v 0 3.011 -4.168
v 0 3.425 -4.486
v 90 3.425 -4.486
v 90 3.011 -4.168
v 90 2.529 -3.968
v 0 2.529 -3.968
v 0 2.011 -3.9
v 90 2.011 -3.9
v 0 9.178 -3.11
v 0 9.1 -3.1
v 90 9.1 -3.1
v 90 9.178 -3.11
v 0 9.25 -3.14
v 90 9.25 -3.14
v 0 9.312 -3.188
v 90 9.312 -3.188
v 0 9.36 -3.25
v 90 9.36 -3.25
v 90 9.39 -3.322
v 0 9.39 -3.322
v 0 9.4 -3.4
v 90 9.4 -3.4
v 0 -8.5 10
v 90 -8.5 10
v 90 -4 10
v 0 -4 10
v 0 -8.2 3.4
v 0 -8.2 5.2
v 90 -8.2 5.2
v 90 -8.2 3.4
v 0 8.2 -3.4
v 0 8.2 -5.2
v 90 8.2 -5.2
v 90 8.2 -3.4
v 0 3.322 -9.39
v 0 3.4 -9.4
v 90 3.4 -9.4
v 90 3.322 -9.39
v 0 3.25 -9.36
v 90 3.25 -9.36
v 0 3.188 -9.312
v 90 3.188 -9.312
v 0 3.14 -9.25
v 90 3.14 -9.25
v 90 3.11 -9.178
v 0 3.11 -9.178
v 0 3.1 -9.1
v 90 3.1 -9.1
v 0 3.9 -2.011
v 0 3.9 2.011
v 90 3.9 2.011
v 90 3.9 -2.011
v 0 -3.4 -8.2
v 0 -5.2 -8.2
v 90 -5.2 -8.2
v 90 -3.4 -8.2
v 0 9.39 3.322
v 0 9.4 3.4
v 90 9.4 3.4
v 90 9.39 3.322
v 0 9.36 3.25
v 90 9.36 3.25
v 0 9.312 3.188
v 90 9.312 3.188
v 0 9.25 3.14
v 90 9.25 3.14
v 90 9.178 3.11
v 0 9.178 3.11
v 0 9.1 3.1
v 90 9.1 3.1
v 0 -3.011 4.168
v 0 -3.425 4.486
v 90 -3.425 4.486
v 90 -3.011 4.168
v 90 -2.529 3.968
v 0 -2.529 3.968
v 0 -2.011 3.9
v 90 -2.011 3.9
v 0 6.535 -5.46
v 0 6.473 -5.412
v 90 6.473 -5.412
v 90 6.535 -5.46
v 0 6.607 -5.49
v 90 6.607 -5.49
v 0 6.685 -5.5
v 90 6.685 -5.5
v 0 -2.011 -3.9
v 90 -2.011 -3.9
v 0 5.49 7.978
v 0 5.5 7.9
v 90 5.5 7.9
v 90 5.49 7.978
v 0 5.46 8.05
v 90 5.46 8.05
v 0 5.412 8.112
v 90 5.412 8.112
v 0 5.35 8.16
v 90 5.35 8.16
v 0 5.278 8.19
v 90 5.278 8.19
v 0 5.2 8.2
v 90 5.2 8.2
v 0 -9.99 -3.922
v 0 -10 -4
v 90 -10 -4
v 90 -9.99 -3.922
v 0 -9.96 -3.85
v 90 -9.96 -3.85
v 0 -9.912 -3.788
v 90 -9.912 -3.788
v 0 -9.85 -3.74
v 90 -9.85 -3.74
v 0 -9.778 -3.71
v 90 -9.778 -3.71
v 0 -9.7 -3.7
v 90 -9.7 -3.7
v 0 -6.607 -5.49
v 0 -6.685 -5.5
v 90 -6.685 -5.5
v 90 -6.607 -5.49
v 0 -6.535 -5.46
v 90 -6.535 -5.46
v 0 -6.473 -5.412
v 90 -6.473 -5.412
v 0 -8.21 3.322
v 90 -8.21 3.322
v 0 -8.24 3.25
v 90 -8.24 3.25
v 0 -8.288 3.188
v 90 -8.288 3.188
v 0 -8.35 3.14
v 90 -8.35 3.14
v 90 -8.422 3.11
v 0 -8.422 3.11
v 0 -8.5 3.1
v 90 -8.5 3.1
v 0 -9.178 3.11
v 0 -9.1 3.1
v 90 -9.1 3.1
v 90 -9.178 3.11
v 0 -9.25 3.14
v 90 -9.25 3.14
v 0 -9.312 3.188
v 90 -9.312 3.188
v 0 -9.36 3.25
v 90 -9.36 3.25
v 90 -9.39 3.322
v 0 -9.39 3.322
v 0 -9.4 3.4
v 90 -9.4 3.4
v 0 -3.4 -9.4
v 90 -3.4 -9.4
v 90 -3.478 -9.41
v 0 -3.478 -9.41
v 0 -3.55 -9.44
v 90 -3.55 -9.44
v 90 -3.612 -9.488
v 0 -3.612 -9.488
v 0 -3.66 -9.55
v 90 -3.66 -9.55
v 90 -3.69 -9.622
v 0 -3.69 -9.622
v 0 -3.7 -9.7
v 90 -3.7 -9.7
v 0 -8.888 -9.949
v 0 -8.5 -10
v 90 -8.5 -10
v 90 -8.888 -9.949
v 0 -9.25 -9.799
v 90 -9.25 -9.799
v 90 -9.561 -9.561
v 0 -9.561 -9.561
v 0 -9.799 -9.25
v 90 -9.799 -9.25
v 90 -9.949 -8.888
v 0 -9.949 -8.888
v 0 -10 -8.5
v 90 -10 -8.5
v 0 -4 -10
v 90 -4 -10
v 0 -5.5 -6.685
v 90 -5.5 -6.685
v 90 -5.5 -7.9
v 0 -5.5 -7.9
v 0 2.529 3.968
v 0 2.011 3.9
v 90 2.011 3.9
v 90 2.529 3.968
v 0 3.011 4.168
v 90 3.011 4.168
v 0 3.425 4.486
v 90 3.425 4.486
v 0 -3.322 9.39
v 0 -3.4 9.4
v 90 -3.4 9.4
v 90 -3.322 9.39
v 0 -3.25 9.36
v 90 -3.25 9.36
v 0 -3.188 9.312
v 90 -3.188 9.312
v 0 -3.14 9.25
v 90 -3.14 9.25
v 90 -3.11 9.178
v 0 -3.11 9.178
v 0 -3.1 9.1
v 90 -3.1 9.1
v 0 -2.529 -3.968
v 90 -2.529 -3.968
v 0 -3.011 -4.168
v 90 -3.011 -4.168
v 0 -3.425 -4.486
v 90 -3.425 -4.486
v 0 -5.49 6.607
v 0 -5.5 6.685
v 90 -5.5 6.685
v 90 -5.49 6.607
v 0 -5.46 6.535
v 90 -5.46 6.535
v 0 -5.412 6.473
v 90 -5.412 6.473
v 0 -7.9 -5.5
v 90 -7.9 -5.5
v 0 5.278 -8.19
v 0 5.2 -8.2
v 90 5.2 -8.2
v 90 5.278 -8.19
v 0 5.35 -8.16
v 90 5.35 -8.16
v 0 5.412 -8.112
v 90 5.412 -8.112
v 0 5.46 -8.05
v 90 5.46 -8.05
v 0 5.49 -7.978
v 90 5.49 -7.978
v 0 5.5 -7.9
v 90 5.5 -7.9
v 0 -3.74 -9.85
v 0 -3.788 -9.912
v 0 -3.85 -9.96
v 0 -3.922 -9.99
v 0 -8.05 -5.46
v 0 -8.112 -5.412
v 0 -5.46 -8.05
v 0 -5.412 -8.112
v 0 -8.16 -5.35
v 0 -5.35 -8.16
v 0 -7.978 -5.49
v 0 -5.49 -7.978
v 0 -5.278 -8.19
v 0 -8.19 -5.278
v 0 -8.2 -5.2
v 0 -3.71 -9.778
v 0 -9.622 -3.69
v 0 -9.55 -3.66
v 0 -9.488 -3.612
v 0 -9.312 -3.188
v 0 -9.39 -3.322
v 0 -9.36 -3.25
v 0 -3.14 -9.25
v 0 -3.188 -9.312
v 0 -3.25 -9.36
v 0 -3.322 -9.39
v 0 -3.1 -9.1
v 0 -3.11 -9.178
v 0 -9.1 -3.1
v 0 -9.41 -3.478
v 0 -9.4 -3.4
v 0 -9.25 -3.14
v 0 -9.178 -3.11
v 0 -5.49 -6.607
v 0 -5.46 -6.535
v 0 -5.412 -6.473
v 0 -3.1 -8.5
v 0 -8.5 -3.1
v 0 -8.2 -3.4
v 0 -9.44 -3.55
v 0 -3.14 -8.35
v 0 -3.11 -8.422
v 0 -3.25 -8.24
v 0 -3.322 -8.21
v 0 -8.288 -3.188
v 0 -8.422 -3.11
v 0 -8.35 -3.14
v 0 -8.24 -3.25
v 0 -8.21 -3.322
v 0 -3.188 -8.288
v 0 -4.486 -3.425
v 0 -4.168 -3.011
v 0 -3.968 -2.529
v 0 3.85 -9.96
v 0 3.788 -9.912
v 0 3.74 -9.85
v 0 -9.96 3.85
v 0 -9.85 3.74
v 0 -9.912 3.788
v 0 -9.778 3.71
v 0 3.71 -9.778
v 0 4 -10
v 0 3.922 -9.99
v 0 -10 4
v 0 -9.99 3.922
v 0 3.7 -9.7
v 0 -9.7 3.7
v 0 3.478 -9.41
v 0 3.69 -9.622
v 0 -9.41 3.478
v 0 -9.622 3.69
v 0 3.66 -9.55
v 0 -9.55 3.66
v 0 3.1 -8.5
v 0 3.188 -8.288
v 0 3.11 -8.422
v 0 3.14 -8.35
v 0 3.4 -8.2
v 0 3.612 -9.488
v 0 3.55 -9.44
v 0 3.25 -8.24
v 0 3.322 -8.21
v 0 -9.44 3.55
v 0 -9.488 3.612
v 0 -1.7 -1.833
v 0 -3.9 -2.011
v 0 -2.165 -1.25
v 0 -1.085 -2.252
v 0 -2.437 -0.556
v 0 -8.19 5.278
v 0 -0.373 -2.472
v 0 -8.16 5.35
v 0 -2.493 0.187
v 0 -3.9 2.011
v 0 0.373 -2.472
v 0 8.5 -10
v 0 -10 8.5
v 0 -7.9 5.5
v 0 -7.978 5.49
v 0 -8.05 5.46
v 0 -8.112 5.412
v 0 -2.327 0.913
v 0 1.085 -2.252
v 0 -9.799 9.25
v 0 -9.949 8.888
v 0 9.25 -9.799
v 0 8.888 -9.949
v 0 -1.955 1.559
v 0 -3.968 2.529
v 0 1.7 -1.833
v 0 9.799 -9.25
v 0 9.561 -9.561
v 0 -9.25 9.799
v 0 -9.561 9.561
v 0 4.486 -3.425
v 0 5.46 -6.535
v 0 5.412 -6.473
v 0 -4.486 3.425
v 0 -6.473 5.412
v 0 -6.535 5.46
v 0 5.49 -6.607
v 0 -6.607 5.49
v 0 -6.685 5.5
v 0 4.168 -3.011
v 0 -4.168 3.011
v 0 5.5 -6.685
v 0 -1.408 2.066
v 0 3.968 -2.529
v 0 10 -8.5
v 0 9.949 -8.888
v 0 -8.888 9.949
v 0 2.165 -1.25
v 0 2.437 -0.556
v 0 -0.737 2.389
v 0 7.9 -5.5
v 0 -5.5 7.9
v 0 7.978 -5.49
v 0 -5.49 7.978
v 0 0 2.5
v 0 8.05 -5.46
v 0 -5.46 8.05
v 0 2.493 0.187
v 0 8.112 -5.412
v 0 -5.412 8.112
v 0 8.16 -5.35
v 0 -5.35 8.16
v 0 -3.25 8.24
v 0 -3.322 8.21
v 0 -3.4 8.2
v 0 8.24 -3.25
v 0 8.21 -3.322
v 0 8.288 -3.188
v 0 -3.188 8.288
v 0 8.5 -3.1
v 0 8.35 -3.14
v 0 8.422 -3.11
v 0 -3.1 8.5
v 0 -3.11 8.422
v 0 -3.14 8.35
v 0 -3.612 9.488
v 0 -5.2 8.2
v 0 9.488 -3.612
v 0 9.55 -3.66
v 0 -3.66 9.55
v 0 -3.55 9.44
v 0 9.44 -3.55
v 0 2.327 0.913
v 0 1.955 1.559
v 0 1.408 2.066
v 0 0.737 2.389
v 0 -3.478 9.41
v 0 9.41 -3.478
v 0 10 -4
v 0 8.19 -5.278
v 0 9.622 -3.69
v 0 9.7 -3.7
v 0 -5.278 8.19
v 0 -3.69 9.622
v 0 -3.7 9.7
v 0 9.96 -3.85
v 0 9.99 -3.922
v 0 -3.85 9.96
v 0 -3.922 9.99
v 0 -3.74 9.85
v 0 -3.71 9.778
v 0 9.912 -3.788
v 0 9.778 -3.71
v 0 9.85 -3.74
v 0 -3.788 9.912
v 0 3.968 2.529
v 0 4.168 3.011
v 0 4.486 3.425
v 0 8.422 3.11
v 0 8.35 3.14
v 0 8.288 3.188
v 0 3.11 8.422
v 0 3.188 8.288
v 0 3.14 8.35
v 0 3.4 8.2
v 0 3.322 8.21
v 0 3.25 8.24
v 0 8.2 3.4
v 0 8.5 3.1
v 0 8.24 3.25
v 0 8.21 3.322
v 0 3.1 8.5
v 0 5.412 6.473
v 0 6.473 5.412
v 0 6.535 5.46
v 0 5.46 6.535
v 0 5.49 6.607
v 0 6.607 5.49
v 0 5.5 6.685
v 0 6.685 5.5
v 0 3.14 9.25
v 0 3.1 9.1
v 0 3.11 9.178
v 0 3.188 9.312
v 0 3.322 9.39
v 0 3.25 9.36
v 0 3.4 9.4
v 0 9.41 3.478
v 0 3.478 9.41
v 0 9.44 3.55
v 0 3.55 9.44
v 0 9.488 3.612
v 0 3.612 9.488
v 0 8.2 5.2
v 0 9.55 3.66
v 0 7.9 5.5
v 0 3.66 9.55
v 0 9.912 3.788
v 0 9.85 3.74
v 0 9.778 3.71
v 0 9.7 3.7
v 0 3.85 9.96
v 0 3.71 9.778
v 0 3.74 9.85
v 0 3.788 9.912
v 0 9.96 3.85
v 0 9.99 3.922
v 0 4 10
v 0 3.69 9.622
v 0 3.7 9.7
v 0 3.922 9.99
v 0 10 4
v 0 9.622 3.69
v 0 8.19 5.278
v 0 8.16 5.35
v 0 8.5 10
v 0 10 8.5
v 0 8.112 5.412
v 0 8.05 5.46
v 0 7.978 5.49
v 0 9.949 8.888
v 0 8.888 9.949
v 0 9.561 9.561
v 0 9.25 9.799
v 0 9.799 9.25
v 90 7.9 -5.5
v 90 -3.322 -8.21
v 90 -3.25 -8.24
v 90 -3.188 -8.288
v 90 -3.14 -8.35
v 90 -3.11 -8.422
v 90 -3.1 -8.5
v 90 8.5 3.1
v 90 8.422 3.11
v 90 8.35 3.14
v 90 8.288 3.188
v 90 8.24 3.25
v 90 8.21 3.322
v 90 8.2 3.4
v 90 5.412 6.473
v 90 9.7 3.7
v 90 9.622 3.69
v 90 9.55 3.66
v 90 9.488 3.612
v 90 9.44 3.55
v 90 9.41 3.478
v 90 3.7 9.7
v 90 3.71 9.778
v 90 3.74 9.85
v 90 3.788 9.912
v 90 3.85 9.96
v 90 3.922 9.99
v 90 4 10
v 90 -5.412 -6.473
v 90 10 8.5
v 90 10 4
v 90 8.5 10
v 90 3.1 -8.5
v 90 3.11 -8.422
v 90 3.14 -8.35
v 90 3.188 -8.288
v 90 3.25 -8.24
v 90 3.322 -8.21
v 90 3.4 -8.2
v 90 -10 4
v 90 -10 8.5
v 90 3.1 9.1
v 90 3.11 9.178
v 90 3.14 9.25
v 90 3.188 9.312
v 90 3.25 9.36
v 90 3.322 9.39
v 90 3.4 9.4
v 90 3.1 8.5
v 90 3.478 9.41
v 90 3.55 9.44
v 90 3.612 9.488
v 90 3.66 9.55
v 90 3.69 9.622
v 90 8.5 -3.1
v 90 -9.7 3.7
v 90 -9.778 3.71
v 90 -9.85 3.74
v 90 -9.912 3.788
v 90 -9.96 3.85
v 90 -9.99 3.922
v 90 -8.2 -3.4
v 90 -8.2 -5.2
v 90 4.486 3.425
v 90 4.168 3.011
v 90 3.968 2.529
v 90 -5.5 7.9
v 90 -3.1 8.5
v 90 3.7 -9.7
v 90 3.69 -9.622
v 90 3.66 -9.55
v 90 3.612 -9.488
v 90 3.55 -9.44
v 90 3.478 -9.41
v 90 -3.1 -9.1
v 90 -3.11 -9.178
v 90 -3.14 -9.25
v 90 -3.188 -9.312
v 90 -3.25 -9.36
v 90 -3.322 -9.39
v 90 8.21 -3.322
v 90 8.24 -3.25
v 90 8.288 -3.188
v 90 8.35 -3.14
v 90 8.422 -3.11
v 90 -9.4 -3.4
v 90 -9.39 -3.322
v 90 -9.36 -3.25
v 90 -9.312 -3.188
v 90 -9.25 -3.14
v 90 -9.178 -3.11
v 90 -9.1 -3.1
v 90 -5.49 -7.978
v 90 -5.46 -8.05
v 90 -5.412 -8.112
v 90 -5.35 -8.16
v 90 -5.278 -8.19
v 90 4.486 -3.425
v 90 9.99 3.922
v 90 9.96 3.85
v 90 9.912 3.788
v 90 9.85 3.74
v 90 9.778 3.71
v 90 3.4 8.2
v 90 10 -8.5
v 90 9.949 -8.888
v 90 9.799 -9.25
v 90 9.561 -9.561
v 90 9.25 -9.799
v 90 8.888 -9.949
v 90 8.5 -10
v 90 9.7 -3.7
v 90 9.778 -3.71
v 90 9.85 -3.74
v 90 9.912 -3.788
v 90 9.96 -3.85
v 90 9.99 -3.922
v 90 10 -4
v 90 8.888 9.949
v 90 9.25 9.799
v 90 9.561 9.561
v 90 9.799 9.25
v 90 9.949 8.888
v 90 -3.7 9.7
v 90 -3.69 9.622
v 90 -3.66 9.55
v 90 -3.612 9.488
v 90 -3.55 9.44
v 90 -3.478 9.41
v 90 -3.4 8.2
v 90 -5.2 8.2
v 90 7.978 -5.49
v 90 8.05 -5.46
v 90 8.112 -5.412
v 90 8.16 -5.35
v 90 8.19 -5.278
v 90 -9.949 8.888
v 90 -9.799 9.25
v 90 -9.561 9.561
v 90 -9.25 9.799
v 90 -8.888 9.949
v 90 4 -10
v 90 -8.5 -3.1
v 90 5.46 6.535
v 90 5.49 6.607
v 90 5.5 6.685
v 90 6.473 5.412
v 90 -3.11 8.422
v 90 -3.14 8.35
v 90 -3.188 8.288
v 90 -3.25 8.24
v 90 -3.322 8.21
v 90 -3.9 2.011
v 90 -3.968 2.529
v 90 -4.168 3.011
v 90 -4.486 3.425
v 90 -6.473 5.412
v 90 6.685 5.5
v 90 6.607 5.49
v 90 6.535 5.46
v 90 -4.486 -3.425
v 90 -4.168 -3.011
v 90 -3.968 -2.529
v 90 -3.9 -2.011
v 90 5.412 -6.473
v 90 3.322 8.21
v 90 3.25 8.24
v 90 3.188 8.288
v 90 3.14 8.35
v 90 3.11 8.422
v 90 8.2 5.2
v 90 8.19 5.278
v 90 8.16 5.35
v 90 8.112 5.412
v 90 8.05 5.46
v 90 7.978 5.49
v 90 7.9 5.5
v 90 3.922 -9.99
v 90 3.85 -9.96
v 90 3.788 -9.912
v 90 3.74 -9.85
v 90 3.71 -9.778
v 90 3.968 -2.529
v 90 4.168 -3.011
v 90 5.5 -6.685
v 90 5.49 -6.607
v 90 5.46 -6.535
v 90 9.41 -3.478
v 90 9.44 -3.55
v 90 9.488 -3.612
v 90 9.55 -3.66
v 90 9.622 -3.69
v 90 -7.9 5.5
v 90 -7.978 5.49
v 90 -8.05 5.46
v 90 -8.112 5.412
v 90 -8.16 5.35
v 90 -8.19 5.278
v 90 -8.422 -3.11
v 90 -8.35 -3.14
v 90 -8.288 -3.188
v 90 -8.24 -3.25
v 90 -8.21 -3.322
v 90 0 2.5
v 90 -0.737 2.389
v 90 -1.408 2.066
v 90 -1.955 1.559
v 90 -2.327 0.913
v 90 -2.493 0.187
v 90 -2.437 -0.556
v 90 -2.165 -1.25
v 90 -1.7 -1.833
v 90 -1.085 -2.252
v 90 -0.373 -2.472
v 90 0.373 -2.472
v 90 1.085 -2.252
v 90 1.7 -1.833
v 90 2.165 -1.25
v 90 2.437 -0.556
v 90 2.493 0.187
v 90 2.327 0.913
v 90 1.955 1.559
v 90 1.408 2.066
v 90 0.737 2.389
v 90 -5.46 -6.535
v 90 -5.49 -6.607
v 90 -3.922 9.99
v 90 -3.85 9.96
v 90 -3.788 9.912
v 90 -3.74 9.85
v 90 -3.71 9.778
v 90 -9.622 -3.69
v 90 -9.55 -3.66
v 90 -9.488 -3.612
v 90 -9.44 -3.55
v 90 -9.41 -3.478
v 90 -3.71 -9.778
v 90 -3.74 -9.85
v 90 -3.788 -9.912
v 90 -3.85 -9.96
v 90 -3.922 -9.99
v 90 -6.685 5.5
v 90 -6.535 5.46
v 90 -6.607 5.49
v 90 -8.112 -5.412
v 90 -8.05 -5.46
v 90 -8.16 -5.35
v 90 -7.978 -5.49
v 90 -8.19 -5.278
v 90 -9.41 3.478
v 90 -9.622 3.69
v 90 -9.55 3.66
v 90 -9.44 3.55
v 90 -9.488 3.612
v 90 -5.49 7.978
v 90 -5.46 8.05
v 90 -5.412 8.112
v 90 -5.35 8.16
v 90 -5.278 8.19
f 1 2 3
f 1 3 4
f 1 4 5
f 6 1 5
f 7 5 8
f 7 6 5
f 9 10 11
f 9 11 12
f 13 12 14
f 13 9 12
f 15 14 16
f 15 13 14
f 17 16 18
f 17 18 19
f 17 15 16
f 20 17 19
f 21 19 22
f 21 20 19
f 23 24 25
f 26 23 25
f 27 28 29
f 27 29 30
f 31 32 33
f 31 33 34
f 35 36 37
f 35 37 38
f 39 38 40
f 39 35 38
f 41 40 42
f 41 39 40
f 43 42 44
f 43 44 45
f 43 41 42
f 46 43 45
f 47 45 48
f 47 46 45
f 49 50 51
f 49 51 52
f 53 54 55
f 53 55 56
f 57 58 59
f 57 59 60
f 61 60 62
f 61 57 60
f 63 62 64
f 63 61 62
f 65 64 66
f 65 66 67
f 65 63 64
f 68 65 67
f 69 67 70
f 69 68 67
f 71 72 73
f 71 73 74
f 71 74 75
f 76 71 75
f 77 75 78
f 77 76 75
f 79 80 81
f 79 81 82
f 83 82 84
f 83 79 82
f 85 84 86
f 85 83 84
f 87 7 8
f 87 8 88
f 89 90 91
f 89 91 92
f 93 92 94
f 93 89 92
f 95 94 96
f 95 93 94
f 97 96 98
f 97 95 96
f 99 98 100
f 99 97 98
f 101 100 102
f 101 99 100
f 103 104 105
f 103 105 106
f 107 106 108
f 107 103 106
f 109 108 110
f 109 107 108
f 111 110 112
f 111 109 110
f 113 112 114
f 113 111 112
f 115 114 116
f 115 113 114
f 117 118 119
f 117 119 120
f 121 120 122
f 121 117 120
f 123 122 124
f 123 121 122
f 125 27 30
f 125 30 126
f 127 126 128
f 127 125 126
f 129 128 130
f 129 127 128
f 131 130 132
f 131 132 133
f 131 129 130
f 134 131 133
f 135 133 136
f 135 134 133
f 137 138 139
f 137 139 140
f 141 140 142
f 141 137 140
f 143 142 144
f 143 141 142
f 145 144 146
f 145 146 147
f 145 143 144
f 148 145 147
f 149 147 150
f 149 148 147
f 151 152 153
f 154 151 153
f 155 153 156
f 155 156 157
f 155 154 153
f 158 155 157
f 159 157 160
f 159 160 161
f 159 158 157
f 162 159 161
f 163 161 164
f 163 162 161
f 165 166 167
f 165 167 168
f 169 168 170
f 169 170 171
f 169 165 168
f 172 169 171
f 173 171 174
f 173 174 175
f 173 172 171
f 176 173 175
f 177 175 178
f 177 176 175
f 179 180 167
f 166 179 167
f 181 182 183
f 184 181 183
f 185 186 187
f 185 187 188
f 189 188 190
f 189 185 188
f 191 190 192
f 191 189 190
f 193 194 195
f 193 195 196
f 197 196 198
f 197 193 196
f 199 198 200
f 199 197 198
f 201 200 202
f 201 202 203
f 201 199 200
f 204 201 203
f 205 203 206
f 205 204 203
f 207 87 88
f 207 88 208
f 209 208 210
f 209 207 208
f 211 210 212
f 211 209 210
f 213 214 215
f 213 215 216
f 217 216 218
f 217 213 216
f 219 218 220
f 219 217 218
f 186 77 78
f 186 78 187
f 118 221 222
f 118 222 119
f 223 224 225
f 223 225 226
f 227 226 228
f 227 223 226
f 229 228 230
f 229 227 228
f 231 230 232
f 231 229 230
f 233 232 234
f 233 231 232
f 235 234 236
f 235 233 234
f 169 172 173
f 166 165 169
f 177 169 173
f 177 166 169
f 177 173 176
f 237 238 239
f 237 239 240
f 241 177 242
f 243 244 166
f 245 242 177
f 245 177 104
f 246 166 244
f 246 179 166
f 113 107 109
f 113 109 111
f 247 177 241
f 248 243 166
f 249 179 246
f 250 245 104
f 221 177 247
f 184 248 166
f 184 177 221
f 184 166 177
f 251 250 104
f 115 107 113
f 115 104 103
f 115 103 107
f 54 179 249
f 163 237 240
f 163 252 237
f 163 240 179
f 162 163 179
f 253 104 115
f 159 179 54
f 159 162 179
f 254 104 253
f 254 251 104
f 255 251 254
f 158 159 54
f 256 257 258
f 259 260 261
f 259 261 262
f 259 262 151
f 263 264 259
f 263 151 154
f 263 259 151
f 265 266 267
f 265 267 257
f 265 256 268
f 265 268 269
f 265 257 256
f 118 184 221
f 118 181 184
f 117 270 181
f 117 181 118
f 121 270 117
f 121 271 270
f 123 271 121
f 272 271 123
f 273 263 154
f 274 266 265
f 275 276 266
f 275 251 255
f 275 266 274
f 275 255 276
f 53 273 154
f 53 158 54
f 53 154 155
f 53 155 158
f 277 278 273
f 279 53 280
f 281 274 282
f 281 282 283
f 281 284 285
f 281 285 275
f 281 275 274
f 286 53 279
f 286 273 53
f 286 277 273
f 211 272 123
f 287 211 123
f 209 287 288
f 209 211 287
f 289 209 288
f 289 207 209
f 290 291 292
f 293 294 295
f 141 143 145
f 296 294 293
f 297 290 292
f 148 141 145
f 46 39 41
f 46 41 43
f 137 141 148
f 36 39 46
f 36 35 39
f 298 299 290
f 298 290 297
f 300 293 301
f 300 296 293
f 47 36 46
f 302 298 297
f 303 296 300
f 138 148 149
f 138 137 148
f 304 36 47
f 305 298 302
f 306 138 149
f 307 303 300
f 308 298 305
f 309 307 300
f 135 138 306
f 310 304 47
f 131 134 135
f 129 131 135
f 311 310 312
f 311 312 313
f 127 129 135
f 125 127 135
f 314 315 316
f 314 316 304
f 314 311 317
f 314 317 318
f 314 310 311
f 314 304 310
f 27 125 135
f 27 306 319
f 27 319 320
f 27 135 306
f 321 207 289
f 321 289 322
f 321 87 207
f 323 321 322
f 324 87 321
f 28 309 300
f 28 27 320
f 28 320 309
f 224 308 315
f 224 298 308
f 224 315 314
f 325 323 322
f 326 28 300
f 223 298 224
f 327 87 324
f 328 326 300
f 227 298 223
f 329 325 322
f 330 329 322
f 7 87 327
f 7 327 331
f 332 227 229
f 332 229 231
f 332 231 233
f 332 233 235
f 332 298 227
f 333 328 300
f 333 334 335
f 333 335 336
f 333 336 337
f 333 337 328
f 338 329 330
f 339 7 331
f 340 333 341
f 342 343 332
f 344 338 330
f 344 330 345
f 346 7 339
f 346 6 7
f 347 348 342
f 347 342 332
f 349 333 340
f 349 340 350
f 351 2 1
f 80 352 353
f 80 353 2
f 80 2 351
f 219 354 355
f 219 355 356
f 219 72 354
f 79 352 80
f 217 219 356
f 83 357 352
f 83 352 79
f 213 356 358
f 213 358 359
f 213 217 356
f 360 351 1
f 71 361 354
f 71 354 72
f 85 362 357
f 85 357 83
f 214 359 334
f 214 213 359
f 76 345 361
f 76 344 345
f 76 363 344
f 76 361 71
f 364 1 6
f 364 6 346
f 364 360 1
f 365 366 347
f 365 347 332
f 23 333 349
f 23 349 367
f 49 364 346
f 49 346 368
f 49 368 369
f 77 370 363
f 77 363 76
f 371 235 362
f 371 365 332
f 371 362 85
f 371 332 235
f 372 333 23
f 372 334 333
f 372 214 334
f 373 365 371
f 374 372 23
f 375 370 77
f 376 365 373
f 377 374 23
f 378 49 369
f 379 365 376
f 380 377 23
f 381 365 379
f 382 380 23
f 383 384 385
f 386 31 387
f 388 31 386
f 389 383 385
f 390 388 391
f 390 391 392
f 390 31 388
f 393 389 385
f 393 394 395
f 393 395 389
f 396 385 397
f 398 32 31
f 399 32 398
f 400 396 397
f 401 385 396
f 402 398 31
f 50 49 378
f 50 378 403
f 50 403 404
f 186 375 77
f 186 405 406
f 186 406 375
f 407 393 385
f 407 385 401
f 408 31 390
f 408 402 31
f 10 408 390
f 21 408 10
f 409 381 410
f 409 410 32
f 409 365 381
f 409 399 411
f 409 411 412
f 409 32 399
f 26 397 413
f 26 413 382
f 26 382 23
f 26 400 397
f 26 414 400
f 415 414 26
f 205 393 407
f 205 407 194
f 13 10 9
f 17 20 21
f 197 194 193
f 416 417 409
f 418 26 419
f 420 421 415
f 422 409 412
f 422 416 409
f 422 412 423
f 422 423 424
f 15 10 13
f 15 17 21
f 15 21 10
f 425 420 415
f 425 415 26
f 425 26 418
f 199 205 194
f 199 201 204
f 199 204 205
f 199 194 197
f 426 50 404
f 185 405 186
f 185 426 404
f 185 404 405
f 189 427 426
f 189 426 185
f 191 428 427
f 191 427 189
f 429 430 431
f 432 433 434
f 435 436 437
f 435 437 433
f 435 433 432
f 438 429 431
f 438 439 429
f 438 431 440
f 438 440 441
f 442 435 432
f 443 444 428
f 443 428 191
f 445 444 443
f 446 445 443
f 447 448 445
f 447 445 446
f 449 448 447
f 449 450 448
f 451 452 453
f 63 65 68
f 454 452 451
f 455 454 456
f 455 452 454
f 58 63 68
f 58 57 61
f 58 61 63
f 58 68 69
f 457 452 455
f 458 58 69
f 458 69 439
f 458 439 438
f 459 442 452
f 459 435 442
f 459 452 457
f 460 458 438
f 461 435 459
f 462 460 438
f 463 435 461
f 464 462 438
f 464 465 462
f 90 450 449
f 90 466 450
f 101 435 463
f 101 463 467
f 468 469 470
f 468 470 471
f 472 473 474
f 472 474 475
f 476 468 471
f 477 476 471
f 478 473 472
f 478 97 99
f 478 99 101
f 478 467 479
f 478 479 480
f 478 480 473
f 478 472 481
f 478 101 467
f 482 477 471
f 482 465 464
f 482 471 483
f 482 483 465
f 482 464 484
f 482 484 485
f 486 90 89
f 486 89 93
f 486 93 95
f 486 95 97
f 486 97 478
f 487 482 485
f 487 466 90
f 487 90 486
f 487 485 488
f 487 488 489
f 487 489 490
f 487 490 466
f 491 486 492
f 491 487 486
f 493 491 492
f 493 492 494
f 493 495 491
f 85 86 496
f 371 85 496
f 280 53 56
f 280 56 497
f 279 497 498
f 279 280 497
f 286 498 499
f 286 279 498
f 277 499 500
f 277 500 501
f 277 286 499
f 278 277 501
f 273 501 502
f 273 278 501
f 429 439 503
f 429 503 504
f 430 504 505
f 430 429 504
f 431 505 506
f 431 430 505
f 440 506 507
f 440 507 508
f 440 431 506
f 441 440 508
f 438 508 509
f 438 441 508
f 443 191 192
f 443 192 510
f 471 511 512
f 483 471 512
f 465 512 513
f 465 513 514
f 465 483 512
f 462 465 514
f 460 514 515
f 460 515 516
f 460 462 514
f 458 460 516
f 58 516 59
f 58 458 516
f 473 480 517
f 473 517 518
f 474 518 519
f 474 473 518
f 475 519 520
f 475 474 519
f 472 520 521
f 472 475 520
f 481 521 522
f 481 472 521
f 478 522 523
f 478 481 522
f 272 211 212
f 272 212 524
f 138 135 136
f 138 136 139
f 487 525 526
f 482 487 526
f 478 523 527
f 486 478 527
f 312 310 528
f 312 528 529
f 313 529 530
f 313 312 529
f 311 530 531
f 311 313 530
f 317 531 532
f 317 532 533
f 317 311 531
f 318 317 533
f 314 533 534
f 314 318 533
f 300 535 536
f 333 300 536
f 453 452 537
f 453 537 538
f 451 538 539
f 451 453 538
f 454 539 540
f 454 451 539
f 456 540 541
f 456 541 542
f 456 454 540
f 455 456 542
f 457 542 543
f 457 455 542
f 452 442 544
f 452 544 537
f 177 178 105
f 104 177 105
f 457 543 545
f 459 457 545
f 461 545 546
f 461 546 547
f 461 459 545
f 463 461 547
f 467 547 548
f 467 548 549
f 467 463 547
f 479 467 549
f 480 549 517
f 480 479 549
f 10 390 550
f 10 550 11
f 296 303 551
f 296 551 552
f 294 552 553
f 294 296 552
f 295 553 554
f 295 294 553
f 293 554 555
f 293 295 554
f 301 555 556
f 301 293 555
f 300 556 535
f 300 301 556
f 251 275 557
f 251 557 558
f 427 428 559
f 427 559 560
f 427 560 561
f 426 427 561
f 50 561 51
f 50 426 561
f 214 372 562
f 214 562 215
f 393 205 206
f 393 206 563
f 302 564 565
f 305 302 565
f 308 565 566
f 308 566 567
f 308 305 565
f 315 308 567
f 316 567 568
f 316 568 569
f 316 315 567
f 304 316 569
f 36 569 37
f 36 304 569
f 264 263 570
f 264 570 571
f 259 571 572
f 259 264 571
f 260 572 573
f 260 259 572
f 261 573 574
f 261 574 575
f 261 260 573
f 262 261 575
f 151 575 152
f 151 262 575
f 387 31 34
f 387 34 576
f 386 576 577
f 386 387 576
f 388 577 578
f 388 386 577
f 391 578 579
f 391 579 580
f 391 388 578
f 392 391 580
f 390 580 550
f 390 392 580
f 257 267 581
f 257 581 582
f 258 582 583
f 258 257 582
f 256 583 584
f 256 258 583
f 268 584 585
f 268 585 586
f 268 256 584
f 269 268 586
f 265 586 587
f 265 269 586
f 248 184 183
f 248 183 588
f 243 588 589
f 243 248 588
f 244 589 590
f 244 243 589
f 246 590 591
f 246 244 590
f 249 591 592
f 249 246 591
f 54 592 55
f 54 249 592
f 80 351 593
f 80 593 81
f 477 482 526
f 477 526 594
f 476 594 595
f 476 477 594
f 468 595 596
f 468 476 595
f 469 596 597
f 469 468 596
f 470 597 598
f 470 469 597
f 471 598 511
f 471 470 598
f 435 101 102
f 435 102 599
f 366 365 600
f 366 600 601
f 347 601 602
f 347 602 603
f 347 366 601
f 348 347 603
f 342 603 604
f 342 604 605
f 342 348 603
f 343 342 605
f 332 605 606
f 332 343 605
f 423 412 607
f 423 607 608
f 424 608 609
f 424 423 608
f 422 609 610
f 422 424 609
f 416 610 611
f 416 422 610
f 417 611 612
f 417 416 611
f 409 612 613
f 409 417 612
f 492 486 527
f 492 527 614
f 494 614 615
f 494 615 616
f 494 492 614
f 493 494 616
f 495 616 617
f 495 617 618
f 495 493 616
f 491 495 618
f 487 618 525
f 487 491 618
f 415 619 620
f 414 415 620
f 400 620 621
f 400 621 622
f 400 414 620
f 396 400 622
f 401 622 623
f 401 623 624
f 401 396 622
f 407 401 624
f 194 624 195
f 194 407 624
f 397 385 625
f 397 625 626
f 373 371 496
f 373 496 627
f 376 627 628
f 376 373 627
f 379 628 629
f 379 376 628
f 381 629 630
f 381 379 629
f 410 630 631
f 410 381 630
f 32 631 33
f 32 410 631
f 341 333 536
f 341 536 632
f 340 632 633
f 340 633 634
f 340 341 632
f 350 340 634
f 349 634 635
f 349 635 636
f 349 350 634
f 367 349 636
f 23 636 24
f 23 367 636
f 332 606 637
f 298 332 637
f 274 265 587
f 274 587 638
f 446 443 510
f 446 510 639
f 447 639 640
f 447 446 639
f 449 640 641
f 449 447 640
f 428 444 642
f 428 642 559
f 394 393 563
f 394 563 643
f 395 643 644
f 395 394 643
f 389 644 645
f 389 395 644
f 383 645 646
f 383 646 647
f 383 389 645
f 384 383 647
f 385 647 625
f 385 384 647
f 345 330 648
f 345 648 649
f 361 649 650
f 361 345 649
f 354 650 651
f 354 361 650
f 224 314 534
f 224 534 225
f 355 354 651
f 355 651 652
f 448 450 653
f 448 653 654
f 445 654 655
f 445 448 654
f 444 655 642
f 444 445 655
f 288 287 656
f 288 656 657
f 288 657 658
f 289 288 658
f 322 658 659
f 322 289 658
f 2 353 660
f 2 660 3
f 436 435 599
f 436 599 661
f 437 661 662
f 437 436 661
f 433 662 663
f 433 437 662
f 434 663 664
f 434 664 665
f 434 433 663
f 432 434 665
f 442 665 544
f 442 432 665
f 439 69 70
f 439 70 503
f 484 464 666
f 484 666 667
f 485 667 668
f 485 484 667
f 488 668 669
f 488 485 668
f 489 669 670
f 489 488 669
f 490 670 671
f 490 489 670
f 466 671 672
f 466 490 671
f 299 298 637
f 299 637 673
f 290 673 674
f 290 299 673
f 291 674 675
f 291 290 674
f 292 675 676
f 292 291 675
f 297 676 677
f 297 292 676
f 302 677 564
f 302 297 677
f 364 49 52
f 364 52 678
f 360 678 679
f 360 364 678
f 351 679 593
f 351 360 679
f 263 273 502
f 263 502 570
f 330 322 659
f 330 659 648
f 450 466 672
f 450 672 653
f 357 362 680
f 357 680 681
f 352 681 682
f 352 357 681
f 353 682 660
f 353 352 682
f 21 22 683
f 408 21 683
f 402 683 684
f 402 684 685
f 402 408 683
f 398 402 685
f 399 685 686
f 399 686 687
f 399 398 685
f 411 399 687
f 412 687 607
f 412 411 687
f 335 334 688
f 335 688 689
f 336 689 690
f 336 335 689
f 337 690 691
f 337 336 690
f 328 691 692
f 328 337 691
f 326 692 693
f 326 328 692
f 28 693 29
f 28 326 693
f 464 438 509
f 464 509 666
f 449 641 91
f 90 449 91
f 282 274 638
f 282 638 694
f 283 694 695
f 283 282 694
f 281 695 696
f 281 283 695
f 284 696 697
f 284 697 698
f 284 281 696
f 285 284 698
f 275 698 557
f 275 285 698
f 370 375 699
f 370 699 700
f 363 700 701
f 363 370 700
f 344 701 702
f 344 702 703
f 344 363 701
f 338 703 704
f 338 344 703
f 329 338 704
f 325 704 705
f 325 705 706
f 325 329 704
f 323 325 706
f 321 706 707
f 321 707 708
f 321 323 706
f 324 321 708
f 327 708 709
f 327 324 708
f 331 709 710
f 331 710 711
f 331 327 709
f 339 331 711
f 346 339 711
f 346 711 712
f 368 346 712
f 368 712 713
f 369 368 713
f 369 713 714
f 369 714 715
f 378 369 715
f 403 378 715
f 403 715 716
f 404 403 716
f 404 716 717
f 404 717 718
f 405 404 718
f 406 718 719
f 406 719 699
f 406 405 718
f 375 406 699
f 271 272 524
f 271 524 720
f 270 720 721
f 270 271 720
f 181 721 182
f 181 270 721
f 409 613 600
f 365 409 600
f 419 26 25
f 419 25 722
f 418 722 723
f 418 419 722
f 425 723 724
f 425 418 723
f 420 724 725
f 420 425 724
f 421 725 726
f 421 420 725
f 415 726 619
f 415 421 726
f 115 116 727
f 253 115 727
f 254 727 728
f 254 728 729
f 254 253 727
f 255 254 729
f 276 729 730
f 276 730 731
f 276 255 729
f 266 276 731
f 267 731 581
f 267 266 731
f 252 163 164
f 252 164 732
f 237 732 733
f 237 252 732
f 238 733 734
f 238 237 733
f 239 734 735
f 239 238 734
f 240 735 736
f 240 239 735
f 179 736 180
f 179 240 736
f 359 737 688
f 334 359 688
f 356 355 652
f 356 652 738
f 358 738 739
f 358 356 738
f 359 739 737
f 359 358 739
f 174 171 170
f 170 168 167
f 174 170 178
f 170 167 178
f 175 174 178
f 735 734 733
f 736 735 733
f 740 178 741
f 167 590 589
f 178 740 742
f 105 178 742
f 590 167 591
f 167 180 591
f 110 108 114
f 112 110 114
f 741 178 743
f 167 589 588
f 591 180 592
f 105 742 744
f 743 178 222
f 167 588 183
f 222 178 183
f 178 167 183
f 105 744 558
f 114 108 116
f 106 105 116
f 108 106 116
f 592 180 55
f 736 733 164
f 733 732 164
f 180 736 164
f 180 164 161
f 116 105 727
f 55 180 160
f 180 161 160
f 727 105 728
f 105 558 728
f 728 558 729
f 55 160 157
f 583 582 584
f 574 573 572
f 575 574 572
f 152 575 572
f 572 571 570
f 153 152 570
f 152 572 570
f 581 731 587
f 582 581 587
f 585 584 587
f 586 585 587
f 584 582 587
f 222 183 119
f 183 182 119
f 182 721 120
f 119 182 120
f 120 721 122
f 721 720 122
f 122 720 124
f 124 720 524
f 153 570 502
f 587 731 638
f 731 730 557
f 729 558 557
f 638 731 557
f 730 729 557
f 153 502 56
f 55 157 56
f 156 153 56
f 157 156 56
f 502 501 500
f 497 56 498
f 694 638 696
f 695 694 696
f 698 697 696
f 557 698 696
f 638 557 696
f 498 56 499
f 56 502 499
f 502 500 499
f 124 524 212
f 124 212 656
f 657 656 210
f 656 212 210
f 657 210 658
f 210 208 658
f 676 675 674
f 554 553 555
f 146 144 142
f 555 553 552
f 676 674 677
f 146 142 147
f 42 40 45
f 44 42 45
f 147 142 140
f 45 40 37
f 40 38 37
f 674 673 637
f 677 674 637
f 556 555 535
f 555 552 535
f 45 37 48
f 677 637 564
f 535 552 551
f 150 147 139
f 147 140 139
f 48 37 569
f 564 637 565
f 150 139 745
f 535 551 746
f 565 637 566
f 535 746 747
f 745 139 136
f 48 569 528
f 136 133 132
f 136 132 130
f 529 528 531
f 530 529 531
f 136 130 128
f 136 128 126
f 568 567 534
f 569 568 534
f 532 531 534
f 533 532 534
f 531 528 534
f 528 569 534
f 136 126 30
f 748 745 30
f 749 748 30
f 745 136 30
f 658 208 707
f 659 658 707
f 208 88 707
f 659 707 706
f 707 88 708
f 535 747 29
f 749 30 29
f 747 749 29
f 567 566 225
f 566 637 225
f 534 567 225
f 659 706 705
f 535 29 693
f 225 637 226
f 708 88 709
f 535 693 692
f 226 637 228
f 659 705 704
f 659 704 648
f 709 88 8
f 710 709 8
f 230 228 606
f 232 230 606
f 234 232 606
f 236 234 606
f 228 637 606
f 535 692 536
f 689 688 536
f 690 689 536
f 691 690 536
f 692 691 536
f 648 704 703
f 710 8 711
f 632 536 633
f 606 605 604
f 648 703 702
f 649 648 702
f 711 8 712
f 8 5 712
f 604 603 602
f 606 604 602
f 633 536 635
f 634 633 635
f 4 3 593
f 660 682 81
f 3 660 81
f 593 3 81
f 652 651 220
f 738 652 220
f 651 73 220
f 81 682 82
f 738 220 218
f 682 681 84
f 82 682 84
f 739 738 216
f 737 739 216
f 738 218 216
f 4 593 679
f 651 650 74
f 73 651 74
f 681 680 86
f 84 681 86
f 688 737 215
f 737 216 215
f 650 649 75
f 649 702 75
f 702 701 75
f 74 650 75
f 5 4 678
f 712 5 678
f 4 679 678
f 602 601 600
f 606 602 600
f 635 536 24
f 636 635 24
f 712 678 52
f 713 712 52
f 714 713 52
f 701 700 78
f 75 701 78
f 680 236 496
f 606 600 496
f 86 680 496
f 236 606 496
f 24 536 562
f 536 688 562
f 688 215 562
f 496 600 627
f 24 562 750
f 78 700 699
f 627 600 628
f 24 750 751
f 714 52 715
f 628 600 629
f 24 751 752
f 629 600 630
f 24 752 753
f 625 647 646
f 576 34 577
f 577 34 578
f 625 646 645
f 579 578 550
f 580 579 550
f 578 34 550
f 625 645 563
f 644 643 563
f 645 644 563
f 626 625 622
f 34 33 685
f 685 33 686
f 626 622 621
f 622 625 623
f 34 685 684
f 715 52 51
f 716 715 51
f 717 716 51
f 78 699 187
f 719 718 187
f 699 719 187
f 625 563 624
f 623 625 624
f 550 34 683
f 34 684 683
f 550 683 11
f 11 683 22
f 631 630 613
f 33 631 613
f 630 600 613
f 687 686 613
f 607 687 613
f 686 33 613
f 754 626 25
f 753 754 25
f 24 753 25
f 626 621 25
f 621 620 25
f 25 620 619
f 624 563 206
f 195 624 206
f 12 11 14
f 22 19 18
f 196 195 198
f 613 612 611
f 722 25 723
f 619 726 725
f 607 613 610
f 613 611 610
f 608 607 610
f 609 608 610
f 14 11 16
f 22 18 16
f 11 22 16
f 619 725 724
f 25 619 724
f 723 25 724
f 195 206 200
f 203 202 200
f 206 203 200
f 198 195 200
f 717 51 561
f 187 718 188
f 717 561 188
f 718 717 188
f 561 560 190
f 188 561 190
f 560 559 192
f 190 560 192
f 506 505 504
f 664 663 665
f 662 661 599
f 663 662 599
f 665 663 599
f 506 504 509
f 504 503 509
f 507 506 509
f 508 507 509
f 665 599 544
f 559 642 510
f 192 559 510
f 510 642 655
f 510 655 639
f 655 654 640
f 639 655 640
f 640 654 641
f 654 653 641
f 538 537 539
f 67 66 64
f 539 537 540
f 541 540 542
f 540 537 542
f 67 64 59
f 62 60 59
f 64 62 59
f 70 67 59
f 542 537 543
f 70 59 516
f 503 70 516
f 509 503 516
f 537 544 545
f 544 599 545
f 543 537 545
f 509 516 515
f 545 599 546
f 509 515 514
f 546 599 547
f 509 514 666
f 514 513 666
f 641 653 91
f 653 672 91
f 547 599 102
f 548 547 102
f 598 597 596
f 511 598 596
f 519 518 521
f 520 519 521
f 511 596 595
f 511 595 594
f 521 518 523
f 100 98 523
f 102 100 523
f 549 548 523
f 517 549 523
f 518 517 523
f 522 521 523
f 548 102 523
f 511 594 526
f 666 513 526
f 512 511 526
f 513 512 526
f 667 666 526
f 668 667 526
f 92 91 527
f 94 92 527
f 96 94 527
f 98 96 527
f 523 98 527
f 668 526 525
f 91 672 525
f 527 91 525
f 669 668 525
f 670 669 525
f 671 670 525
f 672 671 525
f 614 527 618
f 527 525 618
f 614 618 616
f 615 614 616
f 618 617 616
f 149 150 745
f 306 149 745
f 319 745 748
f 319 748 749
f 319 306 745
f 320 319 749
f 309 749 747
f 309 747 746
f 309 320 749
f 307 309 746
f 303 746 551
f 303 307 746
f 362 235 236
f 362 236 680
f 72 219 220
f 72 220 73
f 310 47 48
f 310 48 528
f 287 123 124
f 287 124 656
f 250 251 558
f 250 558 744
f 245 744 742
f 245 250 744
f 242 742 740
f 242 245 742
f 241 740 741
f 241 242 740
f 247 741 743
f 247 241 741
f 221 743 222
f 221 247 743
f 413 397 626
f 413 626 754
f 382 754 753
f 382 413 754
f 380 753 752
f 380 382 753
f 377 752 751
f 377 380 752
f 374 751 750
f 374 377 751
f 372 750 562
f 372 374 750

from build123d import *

# Parameters (mm, degrees)
SKETCH_1_R      = 2.5
EXTRUDE_1_DEPTH = 90


with BuildPart() as part:
    # 草图1 → 凸台-拉伸1 (new body)
    with BuildSketch(Plane(origin=(0, 0, 0), x_dir=(0, 0, -1), z_dir=(1, 0, 0))):
        with BuildLine():
            Line((10, 8.5), (10, 4))
            ThreePointArc((10, 4), (9.912132034, 3.787867966), (9.7, 3.7))
            ThreePointArc((9.7, 3.7), (9.487867966, 3.612132034), (9.4, 3.4))
            ThreePointArc((9.4, 3.4), (9.312132034, 3.187867966), (9.1, 3.1))
            Line((9.1, 3.1), (8.5, 3.1))
            ThreePointArc((8.5, 3.1), (8.287867966, 3.187867966), (8.2, 3.4))
            Line((8.2, 3.4), (8.2, 5.2))
            ThreePointArc((8.2, 5.2), (8.112132034, 5.412132034), (7.9, 5.5))
            Line((7.9, 5.5), (6.68492424, 5.5))
            ThreePointArc((6.68492424, 5.5), (6.570119211, 5.47716386), (6.472792206, 5.412132034))
            Line((6.472792206, 5.412132034), (4.485786438, 3.425126266))
            ThreePointArc((4.485786438, 3.425126266), (4.052240935, 2.776279568), (3.9, 2.010912703))
            Line((3.9, 2.010912703), (3.9, -2.010912703))
            ThreePointArc((3.9, -2.010912703), (4.052240935, -2.776279568), (4.485786438, -3.425126266))
            Line((4.485786438, -3.425126266), (6.472792206, -5.412132034))
            ThreePointArc((6.472792206, -5.412132034), (6.570119211, -5.47716386), (6.68492424, -5.5))
            Line((6.68492424, -5.5), (7.9, -5.5))
            ThreePointArc((7.9, -5.5), (8.112132034, -5.412132034), (8.2, -5.2))
            Line((8.2, -5.2), (8.2, -3.4))
            ThreePointArc((8.2, -3.4), (8.287867966, -3.187867966), (8.5, -3.1))
            Line((8.5, -3.1), (9.1, -3.1))
            ThreePointArc((9.1, -3.1), (9.312132034, -3.187867966), (9.4, -3.4))
            ThreePointArc((9.4, -3.4), (9.487867966, -3.612132034), (9.7, -3.7))
            ThreePointArc((9.7, -3.7), (9.912132034, -3.787867966), (10, -4))
            Line((10, -4), (10, -8.5))
            ThreePointArc((10, -8.5), (9.560660172, -9.560660172), (8.5, -10))
            Line((8.5, -10), (4, -10))
            ThreePointArc((4, -10), (3.787867966, -9.912132034), (3.7, -9.7))
            ThreePointArc((3.7, -9.7), (3.612132034, -9.487867966), (3.4, -9.4))
            ThreePointArc((3.4, -9.4), (3.187867966, -9.312132034), (3.1, -9.1))
            Line((3.1, -9.1), (3.1, -8.5))
            ThreePointArc((3.1, -8.5), (3.187867966, -8.287867966), (3.4, -8.2))
            Line((3.4, -8.2), (5.2, -8.2))
            ThreePointArc((5.2, -8.2), (5.412132034, -8.112132034), (5.5, -7.9))
            Line((5.5, -7.9), (5.5, -6.68492424))
            ThreePointArc((5.5, -6.68492424), (5.47716386, -6.570119211), (5.412132034, -6.472792206))
            Line((5.412132034, -6.472792206), (3.425126266, -4.485786438))
            ThreePointArc((3.425126266, -4.485786438), (2.776279568, -4.052240935), (2.010912703, -3.9))
            Line((2.010912703, -3.9), (-2.010912703, -3.9))
            ThreePointArc((-2.010912703, -3.9), (-2.776279568, -4.052240935), (-3.425126266, -4.485786438))
            Line((-3.425126266, -4.485786438), (-5.412132034, -6.472792206))
            ThreePointArc((-5.412132034, -6.472792206), (-5.47716386, -6.570119211), (-5.5, -6.68492424))
            Line((-5.5, -6.68492424), (-5.5, -7.9))
            ThreePointArc((-5.5, -7.9), (-5.412132034, -8.112132034), (-5.2, -8.2))
            Line((-5.2, -8.2), (-3.4, -8.2))
            ThreePointArc((-3.4, -8.2), (-3.187867966, -8.287867966), (-3.1, -8.5))
            Line((-3.1, -8.5), (-3.1, -9.1))
            ThreePointArc((-3.1, -9.1), (-3.187867966, -9.312132034), (-3.4, -9.4))
            ThreePointArc((-3.4, -9.4), (-3.612132034, -9.487867966), (-3.7, -9.7))
            ThreePointArc((-3.7, -9.7), (-3.787867966, -9.912132034), (-4, -10))
            Line((-4, -10), (-8.5, -10))
            ThreePointArc((-8.5, -10), (-9.560660172, -9.560660172), (-10, -8.5))
            Line((-10, -8.5), (-10, -4))
            ThreePointArc((-10, -4), (-9.912132034, -3.787867966), (-9.7, -3.7))
            ThreePointArc((-9.7, -3.7), (-9.487867966, -3.612132034), (-9.4, -3.4))
            ThreePointArc((-9.4, -3.4), (-9.312132034, -3.187867966), (-9.1, -3.1))
            Line((-9.1, -3.1), (-8.5, -3.1))
            ThreePointArc((-8.5, -3.1), (-8.287867966, -3.187867966), (-8.2, -3.4))
            Line((-8.2, -3.4), (-8.2, -5.2))
            ThreePointArc((-8.2, -5.2), (-8.112132034, -5.412132034), (-7.9, -5.5))
            Line((-7.9, -5.5), (-6.68492424, -5.5))
            ThreePointArc((-6.68492424, -5.5), (-6.570119211, -5.47716386), (-6.472792206, -5.412132034))
            Line((-6.472792206, -5.412132034), (-4.485786438, -3.425126266))
            ThreePointArc((-4.485786438, -3.425126266), (-4.052240935, -2.776279568), (-3.9, -2.010912703))
            Line((-3.9, -2.010912703), (-3.9, 2.010912703))
            ThreePointArc((-3.9, 2.010912703), (-4.052240935, 2.776279568), (-4.485786438, 3.425126266))
            Line((-4.485786438, 3.425126266), (-6.472792206, 5.412132034))
            ThreePointArc((-6.472792206, 5.412132034), (-6.570119211, 5.47716386), (-6.68492424, 5.5))
            Line((-6.68492424, 5.5), (-7.9, 5.5))
            ThreePointArc((-7.9, 5.5), (-8.112132034, 5.412132034), (-8.2, 5.2))
            Line((-8.2, 5.2), (-8.2, 3.4))
            ThreePointArc((-8.2, 3.4), (-8.287867966, 3.187867966), (-8.5, 3.1))
            Line((-8.5, 3.1), (-9.1, 3.1))
            ThreePointArc((-9.1, 3.1), (-9.312132034, 3.187867966), (-9.4, 3.4))
            ThreePointArc((-9.4, 3.4), (-9.487867966, 3.612132034), (-9.7, 3.7))
            ThreePointArc((-9.7, 3.7), (-9.912132034, 3.787867966), (-10, 4))
            Line((-10, 4), (-10, 8.5))
            ThreePointArc((-10, 8.5), (-9.560660172, 9.560660172), (-8.5, 10))
            Line((-8.5, 10), (-4, 10))
            ThreePointArc((-4, 10), (-3.787867966, 9.912132034), (-3.7, 9.7))
            ThreePointArc((-3.7, 9.7), (-3.612132034, 9.487867966), (-3.4, 9.4))
            ThreePointArc((-3.4, 9.4), (-3.187867966, 9.312132034), (-3.1, 9.1))
            Line((-3.1, 9.1), (-3.1, 8.5))
            ThreePointArc((-3.1, 8.5), (-3.187867966, 8.287867966), (-3.4, 8.2))
            Line((-3.4, 8.2), (-5.2, 8.2))
            ThreePointArc((-5.2, 8.2), (-5.412132034, 8.112132034), (-5.5, 7.9))
            Line((-5.5, 7.9), (-5.5, 6.68492424))
            ThreePointArc((-5.5, 6.68492424), (-5.47716386, 6.570119211), (-5.412132034, 6.472792206))
            Line((-5.412132034, 6.472792206), (-3.425126266, 4.485786438))
            ThreePointArc((-3.425126266, 4.485786438), (-2.776279568, 4.052240935), (-2.010912703, 3.9))
            Line((-2.010912703, 3.9), (2.010912703, 3.9))
            ThreePointArc((2.010912703, 3.9), (2.776279568, 4.052240935), (3.425126266, 4.485786438))
            Line((3.425126266, 4.485786438), (5.412132034, 6.472792206))
            ThreePointArc((5.412132034, 6.472792206), (5.47716386, 6.570119211), (5.5, 6.68492424))
            Line((5.5, 6.68492424), (5.5, 7.9))
            ThreePointArc((5.5, 7.9), (5.412132034, 8.112132034), (5.2, 8.2))
            Line((5.2, 8.2), (3.4, 8.2))
            ThreePointArc((3.4, 8.2), (3.187867966, 8.287867966), (3.1, 8.5))
            Line((3.1, 8.5), (3.1, 9.1))
            ThreePointArc((3.1, 9.1), (3.187867966, 9.312132034), (3.4, 9.4))
            ThreePointArc((3.4, 9.4), (3.612132034, 9.487867966), (3.7, 9.7))
            ThreePointArc((3.7, 9.7), (3.787867966, 9.912132034), (4, 10))
            Line((4, 10), (8.5, 10))
            ThreePointArc((8.5, 10), (9.560660172, 9.560660172), (10, 8.5))
        make_face()
        with Locations(Location((0, 0, 0), (0, 0, 180))):
            Circle(SKETCH_1_R, mode=Mode.SUBTRACT)
    extrude(amount=EXTRUDE_1_DEPTH)


solid = part.part
